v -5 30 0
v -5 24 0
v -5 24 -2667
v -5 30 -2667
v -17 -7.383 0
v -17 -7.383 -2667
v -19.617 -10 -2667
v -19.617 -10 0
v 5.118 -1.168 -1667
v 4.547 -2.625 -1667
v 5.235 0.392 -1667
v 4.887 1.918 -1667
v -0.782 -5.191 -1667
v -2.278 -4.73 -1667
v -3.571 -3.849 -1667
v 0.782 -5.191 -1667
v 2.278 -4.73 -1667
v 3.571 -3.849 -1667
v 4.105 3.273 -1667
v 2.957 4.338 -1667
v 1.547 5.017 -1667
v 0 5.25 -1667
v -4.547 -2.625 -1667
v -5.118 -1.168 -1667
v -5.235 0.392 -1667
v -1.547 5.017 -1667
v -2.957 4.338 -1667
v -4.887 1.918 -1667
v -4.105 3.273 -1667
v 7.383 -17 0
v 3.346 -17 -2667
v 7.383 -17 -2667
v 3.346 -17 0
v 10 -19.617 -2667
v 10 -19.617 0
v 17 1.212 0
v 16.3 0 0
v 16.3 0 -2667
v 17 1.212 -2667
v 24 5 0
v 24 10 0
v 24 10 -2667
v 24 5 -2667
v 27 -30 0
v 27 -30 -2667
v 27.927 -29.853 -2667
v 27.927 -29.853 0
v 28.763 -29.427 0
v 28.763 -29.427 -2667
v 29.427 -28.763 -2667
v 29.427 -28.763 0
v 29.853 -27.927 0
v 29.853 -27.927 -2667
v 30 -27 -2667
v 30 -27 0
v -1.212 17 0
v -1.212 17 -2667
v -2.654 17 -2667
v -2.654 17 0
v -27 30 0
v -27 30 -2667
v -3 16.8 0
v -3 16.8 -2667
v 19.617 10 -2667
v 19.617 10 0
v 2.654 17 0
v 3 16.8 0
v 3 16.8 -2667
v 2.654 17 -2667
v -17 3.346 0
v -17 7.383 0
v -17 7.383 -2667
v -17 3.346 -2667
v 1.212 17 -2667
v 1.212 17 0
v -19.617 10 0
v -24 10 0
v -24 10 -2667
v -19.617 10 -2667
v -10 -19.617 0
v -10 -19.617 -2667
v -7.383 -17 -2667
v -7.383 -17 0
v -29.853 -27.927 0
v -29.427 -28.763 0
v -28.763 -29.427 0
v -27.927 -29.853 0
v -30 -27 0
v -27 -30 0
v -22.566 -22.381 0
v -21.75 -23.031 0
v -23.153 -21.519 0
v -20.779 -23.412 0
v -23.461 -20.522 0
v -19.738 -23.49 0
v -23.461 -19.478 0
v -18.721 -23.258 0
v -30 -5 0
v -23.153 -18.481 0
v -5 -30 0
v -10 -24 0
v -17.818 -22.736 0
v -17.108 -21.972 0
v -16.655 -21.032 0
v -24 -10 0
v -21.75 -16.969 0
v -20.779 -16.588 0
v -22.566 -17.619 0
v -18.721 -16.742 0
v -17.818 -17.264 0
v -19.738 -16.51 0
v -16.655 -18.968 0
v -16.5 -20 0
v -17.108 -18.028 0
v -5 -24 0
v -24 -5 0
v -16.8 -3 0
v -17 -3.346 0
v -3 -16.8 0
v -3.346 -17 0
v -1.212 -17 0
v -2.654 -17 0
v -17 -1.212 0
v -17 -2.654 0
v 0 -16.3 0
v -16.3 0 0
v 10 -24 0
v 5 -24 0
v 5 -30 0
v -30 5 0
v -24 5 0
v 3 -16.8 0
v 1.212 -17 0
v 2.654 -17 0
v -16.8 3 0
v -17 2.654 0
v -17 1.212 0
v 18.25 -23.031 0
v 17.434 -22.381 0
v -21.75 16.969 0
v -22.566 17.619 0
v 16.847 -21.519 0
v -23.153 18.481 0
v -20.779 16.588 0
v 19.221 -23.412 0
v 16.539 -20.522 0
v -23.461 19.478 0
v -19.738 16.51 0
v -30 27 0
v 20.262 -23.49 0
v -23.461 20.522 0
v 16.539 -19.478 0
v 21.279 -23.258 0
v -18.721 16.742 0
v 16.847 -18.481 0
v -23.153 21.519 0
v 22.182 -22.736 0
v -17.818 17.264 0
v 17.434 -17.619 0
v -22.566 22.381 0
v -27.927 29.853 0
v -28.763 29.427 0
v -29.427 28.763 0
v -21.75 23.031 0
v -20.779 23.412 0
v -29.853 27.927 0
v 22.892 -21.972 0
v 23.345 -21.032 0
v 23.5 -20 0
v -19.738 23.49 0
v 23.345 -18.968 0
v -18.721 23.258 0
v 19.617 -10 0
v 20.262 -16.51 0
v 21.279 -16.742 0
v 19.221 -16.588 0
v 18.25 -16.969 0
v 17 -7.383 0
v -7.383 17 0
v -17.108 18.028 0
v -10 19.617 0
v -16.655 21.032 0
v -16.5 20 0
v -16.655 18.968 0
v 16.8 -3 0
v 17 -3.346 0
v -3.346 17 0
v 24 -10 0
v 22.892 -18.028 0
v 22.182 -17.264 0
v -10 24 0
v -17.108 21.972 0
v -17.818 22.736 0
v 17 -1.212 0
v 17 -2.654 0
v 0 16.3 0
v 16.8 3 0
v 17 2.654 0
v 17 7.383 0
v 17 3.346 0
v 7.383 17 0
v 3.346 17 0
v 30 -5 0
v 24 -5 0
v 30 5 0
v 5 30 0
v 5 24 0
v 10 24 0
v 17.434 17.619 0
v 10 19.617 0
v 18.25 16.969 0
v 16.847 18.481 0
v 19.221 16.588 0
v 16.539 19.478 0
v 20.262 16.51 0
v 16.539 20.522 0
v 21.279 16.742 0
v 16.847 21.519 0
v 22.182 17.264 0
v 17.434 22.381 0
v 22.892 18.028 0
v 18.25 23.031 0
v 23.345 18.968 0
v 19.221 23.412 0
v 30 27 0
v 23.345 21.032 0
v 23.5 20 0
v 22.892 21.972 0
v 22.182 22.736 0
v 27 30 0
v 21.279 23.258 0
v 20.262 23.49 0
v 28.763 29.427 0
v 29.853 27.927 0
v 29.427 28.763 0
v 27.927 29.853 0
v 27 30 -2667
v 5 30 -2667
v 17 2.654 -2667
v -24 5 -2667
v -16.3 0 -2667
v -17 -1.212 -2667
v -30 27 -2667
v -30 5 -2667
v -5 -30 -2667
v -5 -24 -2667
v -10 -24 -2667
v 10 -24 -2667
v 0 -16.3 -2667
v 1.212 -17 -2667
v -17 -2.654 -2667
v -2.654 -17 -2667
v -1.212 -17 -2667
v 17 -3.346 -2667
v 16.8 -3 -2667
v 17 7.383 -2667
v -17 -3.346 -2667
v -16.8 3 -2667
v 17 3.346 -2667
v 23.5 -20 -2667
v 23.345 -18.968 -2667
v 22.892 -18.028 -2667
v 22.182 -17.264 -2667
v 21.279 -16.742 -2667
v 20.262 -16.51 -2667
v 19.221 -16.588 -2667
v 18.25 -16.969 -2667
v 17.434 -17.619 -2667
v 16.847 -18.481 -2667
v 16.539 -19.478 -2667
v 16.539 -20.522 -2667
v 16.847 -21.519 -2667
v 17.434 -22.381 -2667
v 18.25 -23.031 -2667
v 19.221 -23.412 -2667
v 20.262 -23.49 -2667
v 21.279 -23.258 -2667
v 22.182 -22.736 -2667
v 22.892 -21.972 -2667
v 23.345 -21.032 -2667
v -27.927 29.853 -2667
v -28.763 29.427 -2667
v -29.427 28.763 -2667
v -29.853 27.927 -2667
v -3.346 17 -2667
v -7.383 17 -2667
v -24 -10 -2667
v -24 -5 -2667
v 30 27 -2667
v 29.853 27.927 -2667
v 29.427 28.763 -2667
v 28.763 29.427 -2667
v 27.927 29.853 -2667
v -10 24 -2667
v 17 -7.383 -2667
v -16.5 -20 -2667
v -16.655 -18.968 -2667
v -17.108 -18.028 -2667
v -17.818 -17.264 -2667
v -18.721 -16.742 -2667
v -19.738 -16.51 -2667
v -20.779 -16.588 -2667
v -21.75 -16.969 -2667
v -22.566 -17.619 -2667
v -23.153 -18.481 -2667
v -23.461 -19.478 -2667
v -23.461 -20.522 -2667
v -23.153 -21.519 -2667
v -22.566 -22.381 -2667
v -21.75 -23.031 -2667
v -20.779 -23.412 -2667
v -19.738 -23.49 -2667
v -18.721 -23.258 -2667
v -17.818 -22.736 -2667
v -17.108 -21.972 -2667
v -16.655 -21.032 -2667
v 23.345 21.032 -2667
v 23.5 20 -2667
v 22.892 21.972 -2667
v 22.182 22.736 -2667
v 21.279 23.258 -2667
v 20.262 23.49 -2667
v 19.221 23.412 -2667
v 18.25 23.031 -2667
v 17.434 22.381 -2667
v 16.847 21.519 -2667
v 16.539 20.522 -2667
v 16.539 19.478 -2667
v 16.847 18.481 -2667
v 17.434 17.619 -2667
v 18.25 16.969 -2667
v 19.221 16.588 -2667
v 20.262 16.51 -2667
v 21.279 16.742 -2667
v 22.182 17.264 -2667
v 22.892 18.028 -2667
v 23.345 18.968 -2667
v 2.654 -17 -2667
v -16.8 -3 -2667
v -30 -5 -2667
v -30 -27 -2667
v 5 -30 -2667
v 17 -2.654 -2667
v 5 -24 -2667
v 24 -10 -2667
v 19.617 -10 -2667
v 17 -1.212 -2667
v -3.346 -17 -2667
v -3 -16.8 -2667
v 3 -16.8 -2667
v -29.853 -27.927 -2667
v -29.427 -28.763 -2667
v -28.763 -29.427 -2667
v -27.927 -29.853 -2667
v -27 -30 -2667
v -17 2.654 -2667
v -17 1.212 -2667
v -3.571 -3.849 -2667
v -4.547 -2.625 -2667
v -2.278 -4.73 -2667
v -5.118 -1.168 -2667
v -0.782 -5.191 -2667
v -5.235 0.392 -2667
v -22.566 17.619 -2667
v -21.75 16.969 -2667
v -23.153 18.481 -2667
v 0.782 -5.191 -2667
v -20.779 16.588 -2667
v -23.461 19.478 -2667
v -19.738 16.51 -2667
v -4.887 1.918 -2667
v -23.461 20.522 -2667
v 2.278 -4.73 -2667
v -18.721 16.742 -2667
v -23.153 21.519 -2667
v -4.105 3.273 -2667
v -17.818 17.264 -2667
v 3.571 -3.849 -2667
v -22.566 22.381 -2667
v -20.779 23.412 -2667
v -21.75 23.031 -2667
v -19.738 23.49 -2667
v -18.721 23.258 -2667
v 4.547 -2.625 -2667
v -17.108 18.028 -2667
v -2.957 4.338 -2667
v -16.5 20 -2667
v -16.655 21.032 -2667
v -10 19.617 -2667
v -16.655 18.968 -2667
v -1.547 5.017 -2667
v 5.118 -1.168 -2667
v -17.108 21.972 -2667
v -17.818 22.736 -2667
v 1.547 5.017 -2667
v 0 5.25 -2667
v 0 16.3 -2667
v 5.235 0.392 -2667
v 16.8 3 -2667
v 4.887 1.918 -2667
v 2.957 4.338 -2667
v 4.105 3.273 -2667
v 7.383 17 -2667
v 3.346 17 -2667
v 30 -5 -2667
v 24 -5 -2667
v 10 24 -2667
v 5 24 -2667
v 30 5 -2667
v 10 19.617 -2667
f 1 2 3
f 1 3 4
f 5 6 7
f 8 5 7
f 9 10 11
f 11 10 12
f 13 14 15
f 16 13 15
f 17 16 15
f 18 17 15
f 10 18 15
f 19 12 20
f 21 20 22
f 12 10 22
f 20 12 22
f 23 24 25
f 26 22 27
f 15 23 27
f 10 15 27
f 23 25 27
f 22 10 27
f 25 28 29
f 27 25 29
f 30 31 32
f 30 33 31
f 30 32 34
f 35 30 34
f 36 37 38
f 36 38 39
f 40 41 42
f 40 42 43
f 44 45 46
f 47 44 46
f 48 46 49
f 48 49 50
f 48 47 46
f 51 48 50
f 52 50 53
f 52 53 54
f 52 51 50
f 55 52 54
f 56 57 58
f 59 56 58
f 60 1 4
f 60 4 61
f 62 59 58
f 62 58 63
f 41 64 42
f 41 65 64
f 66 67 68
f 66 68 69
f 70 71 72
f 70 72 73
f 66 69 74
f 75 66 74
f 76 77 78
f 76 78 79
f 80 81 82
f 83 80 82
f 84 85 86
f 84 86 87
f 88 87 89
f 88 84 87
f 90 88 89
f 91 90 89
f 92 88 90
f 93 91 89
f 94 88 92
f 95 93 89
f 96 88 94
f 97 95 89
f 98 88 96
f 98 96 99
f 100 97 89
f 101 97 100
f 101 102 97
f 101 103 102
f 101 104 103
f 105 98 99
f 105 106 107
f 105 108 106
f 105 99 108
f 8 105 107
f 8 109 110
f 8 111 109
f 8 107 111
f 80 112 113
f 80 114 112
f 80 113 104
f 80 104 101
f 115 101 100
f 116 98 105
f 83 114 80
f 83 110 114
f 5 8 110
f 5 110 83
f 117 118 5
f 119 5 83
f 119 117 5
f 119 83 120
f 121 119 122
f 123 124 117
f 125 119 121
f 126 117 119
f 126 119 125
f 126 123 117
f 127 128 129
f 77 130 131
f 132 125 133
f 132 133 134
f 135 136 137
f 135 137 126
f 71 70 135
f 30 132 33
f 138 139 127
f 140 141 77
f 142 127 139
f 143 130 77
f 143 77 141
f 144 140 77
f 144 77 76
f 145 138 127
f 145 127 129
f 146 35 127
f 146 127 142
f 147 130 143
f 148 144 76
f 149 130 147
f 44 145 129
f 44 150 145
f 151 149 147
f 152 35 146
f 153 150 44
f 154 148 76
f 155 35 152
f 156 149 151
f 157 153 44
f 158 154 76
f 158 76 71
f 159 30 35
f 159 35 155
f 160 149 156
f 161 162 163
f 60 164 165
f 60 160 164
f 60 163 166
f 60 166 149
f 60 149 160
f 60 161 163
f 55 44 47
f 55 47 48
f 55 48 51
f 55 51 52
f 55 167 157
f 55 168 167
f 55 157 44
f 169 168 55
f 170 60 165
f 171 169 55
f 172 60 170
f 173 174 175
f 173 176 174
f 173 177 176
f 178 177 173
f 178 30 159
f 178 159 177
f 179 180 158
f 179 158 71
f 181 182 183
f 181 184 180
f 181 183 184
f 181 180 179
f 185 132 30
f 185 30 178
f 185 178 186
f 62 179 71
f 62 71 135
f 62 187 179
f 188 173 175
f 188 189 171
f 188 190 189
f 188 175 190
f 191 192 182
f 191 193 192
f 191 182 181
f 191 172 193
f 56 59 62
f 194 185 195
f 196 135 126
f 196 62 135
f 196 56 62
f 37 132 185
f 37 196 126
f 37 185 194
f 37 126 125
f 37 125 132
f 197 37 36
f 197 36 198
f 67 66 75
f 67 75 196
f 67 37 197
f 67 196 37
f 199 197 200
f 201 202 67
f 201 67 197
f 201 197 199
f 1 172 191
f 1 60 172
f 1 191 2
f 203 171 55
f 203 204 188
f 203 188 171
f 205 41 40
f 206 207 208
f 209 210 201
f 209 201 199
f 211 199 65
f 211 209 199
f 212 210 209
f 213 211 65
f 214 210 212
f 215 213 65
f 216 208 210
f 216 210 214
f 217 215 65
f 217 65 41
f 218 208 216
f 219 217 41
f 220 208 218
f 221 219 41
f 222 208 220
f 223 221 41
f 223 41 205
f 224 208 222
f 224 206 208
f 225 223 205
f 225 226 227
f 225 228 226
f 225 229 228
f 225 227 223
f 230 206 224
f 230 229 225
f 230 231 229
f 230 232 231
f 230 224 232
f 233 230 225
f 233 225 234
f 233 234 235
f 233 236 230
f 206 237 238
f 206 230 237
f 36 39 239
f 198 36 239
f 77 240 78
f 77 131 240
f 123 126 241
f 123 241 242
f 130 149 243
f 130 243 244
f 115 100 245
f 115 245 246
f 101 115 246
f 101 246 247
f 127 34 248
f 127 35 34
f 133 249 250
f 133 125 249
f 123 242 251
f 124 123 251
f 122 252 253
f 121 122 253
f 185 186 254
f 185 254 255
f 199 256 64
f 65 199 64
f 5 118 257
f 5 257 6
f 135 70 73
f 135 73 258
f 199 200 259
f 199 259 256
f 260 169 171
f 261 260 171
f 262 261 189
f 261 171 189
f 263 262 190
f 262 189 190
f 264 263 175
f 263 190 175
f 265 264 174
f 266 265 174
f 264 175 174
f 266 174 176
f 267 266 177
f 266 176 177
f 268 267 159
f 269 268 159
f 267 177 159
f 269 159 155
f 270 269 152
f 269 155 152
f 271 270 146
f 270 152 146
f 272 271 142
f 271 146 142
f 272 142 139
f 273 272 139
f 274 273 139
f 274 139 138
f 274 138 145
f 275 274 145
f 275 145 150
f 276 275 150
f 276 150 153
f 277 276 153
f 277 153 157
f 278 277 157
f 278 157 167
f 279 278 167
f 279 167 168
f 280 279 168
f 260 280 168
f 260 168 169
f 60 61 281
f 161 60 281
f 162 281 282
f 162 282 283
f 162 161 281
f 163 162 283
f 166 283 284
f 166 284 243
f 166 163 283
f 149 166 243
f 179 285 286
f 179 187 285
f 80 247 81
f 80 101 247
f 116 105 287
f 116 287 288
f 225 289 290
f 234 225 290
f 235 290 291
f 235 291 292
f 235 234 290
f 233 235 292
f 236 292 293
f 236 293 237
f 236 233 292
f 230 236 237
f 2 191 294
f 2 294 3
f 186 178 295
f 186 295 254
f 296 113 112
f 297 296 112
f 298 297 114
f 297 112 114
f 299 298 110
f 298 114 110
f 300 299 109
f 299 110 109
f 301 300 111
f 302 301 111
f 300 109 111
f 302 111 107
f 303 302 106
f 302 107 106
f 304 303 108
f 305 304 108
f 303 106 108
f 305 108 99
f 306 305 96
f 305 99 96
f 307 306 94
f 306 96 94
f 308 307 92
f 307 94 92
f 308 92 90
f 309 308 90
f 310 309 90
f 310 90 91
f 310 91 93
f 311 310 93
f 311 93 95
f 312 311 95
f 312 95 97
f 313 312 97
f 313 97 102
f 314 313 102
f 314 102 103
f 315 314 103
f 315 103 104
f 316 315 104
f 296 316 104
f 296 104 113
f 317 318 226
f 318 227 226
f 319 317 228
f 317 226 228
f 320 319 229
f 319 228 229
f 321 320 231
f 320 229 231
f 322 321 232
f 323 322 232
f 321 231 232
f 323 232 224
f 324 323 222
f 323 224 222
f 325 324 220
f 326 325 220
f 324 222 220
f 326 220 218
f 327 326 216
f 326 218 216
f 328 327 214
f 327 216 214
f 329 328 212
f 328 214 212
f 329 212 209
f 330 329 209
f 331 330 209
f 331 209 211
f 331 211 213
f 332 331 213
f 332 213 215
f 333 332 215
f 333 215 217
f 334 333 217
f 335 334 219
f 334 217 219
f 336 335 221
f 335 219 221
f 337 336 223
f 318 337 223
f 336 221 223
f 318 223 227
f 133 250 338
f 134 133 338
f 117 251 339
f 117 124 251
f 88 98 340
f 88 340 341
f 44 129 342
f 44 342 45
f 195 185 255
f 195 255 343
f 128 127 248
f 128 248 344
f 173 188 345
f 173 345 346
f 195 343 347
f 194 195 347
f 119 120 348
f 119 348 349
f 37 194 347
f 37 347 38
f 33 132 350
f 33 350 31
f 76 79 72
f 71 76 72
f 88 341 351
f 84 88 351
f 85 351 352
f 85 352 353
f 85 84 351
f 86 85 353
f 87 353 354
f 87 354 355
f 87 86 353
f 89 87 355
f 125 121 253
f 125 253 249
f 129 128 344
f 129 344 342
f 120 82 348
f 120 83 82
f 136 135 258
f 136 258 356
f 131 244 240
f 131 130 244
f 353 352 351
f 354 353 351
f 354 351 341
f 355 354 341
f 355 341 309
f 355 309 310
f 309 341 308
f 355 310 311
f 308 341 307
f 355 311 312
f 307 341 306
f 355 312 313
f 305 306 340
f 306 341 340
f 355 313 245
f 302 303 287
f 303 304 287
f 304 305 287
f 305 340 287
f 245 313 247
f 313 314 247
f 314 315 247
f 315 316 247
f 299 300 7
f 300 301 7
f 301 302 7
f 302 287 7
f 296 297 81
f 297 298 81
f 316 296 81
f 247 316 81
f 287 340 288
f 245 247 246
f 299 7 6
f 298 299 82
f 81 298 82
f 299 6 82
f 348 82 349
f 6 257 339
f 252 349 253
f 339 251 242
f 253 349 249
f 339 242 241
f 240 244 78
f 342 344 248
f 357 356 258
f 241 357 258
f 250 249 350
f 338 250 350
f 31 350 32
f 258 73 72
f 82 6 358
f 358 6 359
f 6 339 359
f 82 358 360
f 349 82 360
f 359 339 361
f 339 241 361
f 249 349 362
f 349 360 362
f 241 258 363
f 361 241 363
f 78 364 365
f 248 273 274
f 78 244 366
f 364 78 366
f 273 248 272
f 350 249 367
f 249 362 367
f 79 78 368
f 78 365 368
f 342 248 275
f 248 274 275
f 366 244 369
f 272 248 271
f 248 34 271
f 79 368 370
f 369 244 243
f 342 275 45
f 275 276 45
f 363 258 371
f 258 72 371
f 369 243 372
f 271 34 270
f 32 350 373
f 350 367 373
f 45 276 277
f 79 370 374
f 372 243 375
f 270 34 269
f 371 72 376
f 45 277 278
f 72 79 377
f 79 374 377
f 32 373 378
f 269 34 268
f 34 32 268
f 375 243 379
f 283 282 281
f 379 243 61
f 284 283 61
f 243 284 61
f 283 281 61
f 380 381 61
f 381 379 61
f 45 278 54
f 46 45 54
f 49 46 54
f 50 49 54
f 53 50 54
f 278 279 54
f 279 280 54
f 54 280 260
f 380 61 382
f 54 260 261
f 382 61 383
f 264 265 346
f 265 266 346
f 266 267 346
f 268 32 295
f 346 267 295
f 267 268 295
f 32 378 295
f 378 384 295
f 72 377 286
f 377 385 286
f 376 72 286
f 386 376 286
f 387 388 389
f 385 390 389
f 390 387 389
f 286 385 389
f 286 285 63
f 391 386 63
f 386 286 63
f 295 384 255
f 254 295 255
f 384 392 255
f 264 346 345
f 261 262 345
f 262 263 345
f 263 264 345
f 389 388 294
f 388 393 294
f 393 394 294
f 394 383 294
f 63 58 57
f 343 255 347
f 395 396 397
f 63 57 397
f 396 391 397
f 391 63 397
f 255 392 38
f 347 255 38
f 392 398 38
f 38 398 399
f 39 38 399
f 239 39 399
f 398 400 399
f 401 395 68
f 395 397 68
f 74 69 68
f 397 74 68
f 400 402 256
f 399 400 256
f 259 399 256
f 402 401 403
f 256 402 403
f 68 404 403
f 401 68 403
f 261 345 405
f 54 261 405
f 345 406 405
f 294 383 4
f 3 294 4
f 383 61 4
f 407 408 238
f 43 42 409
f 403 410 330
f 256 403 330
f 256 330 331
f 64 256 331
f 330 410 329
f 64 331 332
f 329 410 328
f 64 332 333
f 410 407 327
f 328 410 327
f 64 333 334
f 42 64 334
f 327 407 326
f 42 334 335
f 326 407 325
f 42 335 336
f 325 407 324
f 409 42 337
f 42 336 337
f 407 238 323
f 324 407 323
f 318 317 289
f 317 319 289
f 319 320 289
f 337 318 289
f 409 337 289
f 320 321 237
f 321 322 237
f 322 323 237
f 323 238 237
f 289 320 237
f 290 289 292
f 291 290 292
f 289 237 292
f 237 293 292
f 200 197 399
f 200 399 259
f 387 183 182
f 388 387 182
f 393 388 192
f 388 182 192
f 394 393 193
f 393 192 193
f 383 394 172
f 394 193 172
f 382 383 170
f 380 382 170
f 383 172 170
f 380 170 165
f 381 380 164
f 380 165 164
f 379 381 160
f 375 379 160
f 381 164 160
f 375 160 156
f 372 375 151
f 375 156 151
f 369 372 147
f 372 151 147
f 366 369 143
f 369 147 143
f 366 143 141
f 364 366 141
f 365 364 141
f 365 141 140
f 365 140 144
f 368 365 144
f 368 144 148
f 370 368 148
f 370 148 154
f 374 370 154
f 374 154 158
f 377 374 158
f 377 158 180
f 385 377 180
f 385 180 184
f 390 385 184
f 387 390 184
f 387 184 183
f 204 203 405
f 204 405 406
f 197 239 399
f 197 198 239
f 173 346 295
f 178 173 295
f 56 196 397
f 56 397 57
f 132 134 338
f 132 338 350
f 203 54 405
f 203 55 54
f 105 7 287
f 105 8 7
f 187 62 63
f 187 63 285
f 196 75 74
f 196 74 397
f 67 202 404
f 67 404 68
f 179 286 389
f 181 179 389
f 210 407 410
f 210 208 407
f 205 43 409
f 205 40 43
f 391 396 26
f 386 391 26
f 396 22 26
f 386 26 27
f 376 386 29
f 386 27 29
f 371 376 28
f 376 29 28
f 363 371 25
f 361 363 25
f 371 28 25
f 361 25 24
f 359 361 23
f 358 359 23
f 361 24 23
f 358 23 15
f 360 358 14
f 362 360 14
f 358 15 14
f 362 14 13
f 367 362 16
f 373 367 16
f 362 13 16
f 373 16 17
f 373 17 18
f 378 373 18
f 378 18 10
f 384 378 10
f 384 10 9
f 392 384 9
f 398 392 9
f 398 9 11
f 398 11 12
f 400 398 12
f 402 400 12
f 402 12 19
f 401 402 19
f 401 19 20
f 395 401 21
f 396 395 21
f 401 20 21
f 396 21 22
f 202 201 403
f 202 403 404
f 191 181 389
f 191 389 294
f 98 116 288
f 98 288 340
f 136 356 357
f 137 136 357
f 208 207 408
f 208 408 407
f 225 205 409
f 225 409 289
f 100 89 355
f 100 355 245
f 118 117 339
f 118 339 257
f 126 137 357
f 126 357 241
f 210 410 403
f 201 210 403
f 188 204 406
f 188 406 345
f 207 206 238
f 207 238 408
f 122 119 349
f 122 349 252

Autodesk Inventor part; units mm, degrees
sketch "Sketch_60" plane through (0, 0, 0) normal (0, 0, 1) x (1, 0, 0)
  arc A0 (-30, -27) -> (-27, -30) centre (-27, -27) ccw
  line L0 (-27, -30) -> (-5, -30)
  line L1 (-5, -30) -> (-5, -24)
  line L2 (-5, -24) -> (-10, -24)
  line L3 (-10, -24) -> (-10, -19.6167)
  line L4 (-10, -19.6167) -> (-7.3833, -17)
  line L5 (-7.3833, -17) -> (-3.3464, -17)
  line L6 (-3.3464, -17) -> (-3, -16.8)
  line L7 (-3, -16.8) -> (-2.6536, -17)
  line L8 (-2.6536, -17) -> (-1.2124, -17)
  line L9 (-1.2124, -17) -> (0, -16.3)
  line L10 (0, -16.3) -> (1.2124, -17)
  line L11 (1.2124, -17) -> (2.6536, -17)
  line L12 (2.6536, -17) -> (3, -16.8)
  line L13 (3, -16.8) -> (3.3464, -17)
  line L14 (3.3464, -17) -> (7.3833, -17)
  line L15 (7.3833, -17) -> (10, -19.6167)
  line L16 (10, -19.6167) -> (10, -24)
  line L17 (10, -24) -> (5, -24)
  line L18 (5, -24) -> (5, -30)
  line L19 (5, -30) -> (27, -30)
  arc A1 (27, -30) -> (30, -27) centre (27, -27) ccw
  line L20 (30, -27) -> (30, -5)
  line L21 (30, -5) -> (24, -5)
  line L22 (24, -5) -> (24, -10)
  line L23 (24, -10) -> (19.6167, -10)
  line L24 (19.6167, -10) -> (17, -7.3833)
  line L25 (17, -7.3833) -> (17, -3.3464)
  line L26 (17, -3.3464) -> (16.8, -3)
  line L27 (16.8, -3) -> (17, -2.6536)
  line L28 (17, -2.6536) -> (17, -1.2124)
  line L29 (17, -1.2124) -> (16.3, 0)
  line L30 (16.3, 0) -> (17, 1.2124)
  line L31 (17, 1.2124) -> (17, 2.6536)
  line L32 (17, 2.6536) -> (16.8, 3)
  line L33 (16.8, 3) -> (17, 3.3464)
  line L34 (17, 3.3464) -> (17, 7.3833)
  line L35 (17, 7.3833) -> (19.6167, 10)
  line L36 (19.6167, 10) -> (24, 10)
  line L37 (24, 10) -> (24, 5)
  line L38 (24, 5) -> (30, 5)
  line L39 (30, 5) -> (30, 27)
  arc A2 (30, 27) -> (27, 30) centre (27, 27) ccw
  line L40 (27, 30) -> (5, 30)
  line L41 (5, 30) -> (5, 24)
  line L42 (5, 24) -> (10, 24)
  line L43 (10, 24) -> (10, 19.6167)
  line L44 (10, 19.6167) -> (7.3833, 17)
  line L45 (7.3833, 17) -> (3.3464, 17)
  line L46 (3.3464, 17) -> (3, 16.8)
  line L47 (3, 16.8) -> (2.6536, 17)
  line L48 (2.6536, 17) -> (1.2124, 17)
  line L49 (1.2124, 17) -> (0, 16.3)
  line L50 (0, 16.3) -> (-1.2124, 17)
  line L51 (-1.2124, 17) -> (-2.6536, 17)
  line L52 (-2.6536, 17) -> (-3, 16.8)
  line L53 (-3, 16.8) -> (-3.3464, 17)
  line L54 (-3.3464, 17) -> (-7.3833, 17)
  line L55 (-7.3833, 17) -> (-10, 19.6167)
  line L56 (-10, 19.6167) -> (-10, 24)
  line L57 (-10, 24) -> (-5, 24)
  line L58 (-5, 24) -> (-5, 30)
  line L59 (-5, 30) -> (-27, 30)
  arc A3 (-27, 30) -> (-30, 27) centre (-27, 27) ccw
  line L60 (-30, 27) -> (-30, 5)
  line L61 (-30, 5) -> (-24, 5)
  line L62 (-24, 5) -> (-24, 10)
  line L63 (-24, 10) -> (-19.6167, 10)
  line L64 (-19.6167, 10) -> (-17, 7.3833)
  line L65 (-17, 7.3833) -> (-17, 3.3464)
  line L66 (-17, 3.3464) -> (-16.8, 3)
  line L67 (-16.8, 3) -> (-17, 2.6536)
  line L68 (-17, 2.6536) -> (-17, 1.2124)
  line L69 (-17, 1.2124) -> (-16.3, 0)
  line L70 (-16.3, 0) -> (-17, -1.2124)
  line L71 (-17, -1.2124) -> (-17, -2.6536)
  line L72 (-17, -2.6536) -> (-16.8, -3)
  line L73 (-16.8, -3) -> (-17, -3.3464)
  line L74 (-17, -3.3464) -> (-17, -7.3833)
  line L75 (-17, -7.3833) -> (-19.6167, -10)
  line L76 (-19.6167, -10) -> (-24, -10)
  line L77 (-24, -10) -> (-24, -5)
  line L78 (-24, -5) -> (-30, -5)
  line L79 (-30, -5) -> (-30, -27)
  circle A4 centre (20, 20) radius 3.5
  circle A5 centre (20, -20) radius 3.5
  circle A6 centre (-20, 20) radius 3.5
  circle A7 centre (-20, -20) radius 3.5
extrude "Extrusion1" add sketch "Sketch_60" against normal blind 2667
sketch "Sketch2" plane through (0, 0, -2667) normal (0, 0, -1) x (-1, 0, 0)
  point P0 (0, 0)
hole "Hole1" at (0, 0, -2667) direction (0, 0, 1) diameter 10.5 depth 1000
ref_plane "C1_XY" through (0, 0, 0) normal (0, 0, 1) x (1, 0, 0)
ref_plane "C1_YZ" through (0, 0, 0) normal (1, 0, 0) x (0, 1, 0)
ref_plane "C1_ZX" through (0, 0, 0) normal (0, 1, 0) x (0, 0, 1)
ref_plane "to_frame_cap1_XY" through (0, 0, 0) normal (0, 0, 1) x (1, 0, 0)
ref_plane "to_frame_cap1_YZ" through (0, 0, 0) normal (1, 0, 0) x (0, 1, 0)
ref_plane "to_frame_cap1_ZX" through (0, 0, 0) normal (0, 1, 0) x (0, 0, 1)
ref_plane "to_frame_cap2_XY" through (0, 0, -1000) normal (0, 0, -1) x (1, 0, 0)
ref_plane "to_frame_cap2_YZ" through (0, 0, -1000) normal (1, 0, 0) x (0, -1, 0)
ref_plane "to_frame_cap2_ZX" through (0, 0, -1000) normal (0, -1, 0) x (0, 0, -1)
properties part number "GFS8-6060-1000"
